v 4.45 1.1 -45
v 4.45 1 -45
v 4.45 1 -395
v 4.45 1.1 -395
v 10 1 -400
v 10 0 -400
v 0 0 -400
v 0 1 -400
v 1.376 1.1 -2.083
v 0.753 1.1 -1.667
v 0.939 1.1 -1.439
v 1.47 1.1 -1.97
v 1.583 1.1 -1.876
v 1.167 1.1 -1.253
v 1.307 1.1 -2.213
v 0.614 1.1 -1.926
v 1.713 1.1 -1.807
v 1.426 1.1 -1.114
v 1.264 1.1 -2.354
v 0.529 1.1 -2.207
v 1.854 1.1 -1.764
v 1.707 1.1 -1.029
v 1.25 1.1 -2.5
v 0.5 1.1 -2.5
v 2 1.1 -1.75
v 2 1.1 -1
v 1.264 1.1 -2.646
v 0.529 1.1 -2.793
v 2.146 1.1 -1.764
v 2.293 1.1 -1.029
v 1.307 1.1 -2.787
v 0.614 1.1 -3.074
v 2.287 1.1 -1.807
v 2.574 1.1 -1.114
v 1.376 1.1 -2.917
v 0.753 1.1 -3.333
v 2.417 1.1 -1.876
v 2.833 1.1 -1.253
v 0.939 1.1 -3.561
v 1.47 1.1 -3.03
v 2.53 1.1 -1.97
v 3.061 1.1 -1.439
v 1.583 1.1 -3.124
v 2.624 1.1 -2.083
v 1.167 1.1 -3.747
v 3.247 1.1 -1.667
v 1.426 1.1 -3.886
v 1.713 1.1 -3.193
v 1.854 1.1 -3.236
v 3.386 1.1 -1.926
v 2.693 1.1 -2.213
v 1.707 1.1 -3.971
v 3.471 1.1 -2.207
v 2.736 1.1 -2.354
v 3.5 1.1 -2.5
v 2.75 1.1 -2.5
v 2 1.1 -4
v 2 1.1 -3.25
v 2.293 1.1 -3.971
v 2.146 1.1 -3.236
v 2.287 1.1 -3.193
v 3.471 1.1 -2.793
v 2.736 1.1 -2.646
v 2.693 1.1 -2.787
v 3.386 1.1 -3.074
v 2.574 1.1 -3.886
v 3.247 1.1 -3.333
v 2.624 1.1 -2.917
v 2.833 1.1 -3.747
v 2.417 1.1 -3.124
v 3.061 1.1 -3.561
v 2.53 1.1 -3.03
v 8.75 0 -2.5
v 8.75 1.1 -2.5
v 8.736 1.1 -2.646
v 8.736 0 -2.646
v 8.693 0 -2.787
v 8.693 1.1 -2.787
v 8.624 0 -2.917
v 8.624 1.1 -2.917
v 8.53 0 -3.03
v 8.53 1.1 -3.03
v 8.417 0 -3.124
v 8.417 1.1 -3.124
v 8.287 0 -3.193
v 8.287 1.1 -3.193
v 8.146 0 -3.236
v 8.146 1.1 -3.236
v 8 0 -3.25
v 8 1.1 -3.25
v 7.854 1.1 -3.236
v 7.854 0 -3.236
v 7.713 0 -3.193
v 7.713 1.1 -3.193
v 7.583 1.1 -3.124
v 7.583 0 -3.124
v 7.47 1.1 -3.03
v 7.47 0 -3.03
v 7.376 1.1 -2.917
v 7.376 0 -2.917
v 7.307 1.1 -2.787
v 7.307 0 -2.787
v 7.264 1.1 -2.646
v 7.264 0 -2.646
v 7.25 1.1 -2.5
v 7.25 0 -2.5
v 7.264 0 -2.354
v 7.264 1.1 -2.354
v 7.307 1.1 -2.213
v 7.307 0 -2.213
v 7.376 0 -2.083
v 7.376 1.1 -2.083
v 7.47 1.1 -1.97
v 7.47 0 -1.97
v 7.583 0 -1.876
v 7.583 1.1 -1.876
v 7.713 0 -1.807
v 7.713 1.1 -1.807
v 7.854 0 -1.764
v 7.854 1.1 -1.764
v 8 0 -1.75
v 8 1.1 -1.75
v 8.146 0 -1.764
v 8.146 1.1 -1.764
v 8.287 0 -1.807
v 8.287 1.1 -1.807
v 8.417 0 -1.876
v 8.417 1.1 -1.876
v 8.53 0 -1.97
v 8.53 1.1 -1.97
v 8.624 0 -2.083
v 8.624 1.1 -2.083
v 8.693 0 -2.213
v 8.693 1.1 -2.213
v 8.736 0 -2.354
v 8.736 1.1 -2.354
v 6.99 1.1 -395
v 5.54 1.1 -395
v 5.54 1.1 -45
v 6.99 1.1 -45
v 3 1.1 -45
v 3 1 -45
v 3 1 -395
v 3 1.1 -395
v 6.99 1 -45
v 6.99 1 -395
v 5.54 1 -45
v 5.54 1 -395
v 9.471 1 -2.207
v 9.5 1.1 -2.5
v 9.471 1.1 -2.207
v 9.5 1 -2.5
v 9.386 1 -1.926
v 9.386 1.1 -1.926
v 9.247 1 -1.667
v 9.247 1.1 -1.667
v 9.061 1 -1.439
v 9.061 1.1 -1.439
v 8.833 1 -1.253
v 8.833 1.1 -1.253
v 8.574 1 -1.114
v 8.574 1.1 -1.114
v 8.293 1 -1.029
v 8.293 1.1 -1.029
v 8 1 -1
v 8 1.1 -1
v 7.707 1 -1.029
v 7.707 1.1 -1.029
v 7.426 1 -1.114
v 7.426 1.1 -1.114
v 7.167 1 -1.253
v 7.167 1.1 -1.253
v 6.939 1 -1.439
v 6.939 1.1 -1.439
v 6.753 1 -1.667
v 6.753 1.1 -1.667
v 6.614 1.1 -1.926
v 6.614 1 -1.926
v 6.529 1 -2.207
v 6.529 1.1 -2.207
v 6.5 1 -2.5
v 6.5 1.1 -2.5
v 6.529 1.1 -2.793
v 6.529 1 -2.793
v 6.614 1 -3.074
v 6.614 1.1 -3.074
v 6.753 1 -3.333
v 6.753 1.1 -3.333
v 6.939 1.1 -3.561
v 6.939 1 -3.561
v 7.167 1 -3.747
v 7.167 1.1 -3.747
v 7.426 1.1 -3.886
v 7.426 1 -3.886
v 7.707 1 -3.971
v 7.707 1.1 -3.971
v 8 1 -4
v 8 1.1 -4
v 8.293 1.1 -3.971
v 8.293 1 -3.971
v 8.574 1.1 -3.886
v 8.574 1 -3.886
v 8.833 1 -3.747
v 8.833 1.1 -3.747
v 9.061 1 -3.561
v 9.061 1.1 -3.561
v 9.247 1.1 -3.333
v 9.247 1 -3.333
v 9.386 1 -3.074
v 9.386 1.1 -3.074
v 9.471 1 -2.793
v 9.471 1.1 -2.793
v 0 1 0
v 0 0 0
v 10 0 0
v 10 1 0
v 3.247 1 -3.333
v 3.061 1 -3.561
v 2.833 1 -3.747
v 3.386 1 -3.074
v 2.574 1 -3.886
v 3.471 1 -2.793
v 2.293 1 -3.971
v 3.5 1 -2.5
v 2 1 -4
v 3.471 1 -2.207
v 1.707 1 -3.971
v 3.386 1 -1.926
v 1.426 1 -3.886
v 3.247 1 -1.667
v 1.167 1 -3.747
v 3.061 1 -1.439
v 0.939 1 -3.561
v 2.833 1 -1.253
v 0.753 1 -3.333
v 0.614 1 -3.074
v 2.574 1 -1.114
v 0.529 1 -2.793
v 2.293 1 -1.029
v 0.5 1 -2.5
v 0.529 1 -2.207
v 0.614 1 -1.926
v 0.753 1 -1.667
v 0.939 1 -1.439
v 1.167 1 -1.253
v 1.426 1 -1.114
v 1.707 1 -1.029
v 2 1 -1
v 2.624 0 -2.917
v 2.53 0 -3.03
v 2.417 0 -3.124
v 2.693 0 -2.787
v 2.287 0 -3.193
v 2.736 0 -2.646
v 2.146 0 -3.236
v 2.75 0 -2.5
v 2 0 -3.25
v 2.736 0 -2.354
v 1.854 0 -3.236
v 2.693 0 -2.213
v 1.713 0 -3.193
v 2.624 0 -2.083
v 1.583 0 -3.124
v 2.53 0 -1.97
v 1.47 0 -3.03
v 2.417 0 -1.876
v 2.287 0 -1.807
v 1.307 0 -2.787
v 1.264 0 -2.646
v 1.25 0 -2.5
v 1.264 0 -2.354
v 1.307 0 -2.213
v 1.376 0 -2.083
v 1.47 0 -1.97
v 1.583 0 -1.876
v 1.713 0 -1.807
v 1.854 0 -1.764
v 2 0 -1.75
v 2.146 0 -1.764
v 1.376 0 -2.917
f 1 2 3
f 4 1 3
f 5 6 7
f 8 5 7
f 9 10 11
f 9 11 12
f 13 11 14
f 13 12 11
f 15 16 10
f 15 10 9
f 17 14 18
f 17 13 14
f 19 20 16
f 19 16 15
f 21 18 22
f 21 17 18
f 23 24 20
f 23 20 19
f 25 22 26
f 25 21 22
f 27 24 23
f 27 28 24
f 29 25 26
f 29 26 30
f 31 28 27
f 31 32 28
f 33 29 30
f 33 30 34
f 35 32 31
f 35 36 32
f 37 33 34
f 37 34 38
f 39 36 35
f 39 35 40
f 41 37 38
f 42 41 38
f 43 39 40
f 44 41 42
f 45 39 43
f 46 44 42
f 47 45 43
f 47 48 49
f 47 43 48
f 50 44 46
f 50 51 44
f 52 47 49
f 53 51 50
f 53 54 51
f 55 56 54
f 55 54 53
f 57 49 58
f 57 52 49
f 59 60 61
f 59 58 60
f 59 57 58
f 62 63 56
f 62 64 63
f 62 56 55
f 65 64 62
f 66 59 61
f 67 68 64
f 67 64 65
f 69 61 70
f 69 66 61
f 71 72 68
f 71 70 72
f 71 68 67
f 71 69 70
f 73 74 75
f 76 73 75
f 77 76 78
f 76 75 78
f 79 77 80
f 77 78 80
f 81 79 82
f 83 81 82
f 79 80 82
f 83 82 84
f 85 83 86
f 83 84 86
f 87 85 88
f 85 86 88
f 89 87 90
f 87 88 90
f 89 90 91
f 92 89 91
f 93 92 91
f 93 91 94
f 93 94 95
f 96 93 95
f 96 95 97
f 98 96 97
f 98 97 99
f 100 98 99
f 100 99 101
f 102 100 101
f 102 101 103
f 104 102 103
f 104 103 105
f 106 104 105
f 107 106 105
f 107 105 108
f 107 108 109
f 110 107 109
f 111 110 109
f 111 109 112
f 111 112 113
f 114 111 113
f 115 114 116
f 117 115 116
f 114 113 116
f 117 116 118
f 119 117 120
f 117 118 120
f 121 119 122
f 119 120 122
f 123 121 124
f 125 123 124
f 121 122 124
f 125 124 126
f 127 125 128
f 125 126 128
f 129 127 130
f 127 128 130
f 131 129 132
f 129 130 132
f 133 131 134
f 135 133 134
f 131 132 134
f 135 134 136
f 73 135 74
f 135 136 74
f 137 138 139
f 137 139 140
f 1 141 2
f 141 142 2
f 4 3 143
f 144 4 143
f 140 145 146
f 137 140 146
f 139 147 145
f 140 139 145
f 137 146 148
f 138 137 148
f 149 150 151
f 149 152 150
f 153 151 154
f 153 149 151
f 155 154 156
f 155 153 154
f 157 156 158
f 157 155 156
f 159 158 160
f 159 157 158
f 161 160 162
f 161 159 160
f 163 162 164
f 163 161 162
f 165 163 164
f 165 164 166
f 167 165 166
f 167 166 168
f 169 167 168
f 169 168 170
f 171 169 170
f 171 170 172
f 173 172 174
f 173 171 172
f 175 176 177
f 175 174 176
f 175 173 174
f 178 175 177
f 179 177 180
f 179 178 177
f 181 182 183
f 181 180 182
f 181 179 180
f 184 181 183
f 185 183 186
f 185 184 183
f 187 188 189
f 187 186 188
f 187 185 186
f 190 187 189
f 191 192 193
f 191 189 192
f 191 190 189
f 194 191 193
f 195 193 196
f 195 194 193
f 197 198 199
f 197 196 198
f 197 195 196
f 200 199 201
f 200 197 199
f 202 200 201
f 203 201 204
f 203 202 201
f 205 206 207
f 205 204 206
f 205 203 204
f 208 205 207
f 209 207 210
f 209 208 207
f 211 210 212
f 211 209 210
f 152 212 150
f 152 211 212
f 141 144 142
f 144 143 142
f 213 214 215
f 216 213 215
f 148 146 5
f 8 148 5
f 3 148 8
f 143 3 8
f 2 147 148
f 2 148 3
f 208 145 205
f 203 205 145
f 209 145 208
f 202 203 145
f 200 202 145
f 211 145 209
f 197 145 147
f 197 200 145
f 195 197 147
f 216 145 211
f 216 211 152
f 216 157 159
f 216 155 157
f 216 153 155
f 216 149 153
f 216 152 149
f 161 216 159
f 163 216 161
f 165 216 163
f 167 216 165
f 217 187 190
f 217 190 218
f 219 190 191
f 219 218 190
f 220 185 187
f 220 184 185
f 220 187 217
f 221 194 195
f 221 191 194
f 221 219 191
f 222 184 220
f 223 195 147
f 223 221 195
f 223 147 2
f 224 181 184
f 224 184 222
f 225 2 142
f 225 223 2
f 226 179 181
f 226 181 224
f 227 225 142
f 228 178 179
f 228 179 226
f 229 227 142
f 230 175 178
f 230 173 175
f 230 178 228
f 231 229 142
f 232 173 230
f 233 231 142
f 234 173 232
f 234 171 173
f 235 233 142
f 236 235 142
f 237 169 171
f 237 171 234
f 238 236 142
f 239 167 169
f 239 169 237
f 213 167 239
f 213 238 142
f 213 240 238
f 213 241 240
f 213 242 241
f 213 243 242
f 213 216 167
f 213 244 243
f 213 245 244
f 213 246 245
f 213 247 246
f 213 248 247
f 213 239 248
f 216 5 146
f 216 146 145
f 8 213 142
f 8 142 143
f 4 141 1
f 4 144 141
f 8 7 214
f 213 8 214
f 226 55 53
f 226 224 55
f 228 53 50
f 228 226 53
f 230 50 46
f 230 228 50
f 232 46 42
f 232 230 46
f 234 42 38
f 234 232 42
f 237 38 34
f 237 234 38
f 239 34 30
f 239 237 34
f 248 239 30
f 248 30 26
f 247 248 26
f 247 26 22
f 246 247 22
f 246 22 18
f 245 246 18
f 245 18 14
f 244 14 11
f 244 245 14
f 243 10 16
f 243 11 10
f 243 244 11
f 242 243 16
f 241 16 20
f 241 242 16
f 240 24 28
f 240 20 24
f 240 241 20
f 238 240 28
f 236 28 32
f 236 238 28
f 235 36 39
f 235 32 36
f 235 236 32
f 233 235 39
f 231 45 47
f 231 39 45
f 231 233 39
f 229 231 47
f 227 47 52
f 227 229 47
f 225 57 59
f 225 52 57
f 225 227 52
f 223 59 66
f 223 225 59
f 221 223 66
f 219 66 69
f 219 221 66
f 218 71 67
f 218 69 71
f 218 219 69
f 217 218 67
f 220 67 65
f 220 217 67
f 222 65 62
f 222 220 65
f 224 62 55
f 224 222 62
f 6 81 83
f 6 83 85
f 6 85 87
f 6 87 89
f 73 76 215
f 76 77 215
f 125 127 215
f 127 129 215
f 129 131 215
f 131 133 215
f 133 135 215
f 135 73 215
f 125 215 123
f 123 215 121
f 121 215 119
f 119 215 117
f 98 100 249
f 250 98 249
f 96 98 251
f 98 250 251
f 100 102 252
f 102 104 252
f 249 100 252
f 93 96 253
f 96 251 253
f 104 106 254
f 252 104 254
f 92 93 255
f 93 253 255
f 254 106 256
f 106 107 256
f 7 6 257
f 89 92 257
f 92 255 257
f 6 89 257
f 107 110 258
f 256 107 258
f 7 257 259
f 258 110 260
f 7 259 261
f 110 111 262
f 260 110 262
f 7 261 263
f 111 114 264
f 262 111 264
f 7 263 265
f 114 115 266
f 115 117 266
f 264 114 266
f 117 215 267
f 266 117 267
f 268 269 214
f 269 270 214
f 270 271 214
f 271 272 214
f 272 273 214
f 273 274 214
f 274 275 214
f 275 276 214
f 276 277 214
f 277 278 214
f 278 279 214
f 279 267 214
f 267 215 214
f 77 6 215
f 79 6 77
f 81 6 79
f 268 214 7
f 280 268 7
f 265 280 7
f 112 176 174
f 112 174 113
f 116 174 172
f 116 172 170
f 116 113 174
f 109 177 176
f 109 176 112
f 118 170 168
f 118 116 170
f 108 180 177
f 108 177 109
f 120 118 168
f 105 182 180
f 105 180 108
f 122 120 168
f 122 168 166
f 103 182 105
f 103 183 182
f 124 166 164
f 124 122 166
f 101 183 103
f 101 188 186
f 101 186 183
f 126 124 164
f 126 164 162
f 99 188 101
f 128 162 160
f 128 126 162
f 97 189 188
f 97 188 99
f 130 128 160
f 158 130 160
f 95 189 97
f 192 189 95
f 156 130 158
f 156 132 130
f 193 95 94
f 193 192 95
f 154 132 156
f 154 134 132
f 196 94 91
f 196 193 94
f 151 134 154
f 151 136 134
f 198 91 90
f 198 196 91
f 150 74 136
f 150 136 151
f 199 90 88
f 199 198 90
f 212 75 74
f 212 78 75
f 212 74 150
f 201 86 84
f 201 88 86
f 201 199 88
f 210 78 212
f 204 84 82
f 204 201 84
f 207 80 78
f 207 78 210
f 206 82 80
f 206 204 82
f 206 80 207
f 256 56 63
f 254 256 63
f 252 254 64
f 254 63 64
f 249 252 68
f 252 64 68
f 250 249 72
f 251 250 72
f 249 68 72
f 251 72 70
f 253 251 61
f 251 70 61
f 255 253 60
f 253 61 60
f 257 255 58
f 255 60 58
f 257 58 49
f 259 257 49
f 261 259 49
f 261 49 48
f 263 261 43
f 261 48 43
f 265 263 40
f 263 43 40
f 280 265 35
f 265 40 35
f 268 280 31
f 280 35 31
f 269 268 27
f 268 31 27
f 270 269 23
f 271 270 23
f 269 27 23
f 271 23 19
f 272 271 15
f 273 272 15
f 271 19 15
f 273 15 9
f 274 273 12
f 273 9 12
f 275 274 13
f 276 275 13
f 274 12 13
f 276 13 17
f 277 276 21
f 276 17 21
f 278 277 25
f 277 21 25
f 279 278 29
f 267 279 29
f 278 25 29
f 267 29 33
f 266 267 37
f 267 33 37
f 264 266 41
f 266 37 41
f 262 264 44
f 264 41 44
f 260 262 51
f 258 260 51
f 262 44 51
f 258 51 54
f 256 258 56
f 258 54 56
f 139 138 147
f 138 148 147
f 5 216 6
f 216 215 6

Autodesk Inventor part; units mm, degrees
ref_plane "YZ Plane" through (0, 0, 0) normal (1, 0, 0) x (0, 1, 0)
ref_plane "XZ Plane" through (0, 0, 0) normal (0, 1, 0) x (-1, 0, 0)
ref_plane "XY Plane" through (0, 0, 0) normal (0, 0, 1) x (1, 0, 0)
sketch "草图1" plane through (0, 0, 0) normal (0, 1, 0) x (-1, 0, 0)
  line L0 (0, 0) -> (-10, 0)
  line L1 (-10, 0) -> (-10, -400)
  line L2 (-10, -400) -> (0, -400)
  line L3 (0, -400) -> (0, 0)
  dimension "d0" = 10
  dimension "d1" = 400
extrude "拉伸1" add sketch "草图1" along normal blind 1
sketch "草图2" plane through (0, 1, 0) normal (0, 1, 0) x (1, 0, 0)
  circle A0 centre (2, 2.5) radius 1.5
  circle A1 centre (8, 2.5) radius 1.5
  line L0 (0, 400) -> (0, 0) projected
  line L1 (10, 0) -> (10, 400) projected
  line L2 (0, 0) -> (10, 0) projected
  dimension "d4" = 3
  dimension "d5" = 3
  dimension "d6" = 2
  dimension "d7" = 2
  dimension "d8" = 2.5
  dimension "d9" = 2.5
sketch "草图3" plane through (0, 1, 0) normal (0, 1, 0) x (1, 0, 0)
  point P0 (0, 0)
extrude "拉伸2" add sketch "草图2" along normal blind 0.1
sketch "草图4" plane through (2, 1.1, -2.5) normal (0, 1, 0) x (1, 0, 0)
  circle A0 centre (0, 0) radius 1.5 projected
  circle A1 centre (0, 0) radius 0.75
  circle A2 centre (6, 0) radius 1.5 projected
  circle A3 centre (6, 0) radius 0.75
  point P0 (-2, -2.5)
  dimension "d12" = 1.5
  dimension "d13" = 1.5
extrude "拉伸3" cut sketch "草图4" against normal blind 3.85 contours A1 | A3
sketch "草图5" plane through (0, 1, 0) normal (0, 1, 0) x (1, 0, 0)
  line L0 (3.0005, 45) -> (4.4505, 45)
  line L1 (4.4505, 45) -> (4.4505, 395)
  line L2 (4.4505, 395) -> (3.0005, 395)
  line L3 (3.0005, 395) -> (3.0005, 45)
  line L4 (5.5405, 45) -> (6.9905, 45)
  line L5 (6.9905, 45) -> (6.9905, 395)
  line L6 (6.9905, 395) -> (5.5405, 395)
  line L7 (5.5405, 395) -> (5.5405, 45)
  line L8 (0, 0) -> (10, 0) projected
  line L9 (10, 400) -> (0, 400) projected
  line L10 (0, 400) -> (0, 0) projected
  dimension "d16" = 1.45
  dimension "d17" = 350
  dimension "d18" = 1.45
  dimension "d19" = 350
  dimension "d20" = 45
  dimension "d21" = 5
  dimension "d22" = 1.09
  dimension "d23" = 3.0005
extrude "拉伸4" add sketch "草图5" along normal blind 0.1
equation "\"折弯半径\" = 厚度"
equation "\"折弯释压宽度\" = 厚度"
equation "\"折弯释压深度\" = 0.5 * 厚度"
equation "\"拐角释压尺寸\" = 4 * 厚度"
equation "\"最小余量\" = 2 * 厚度"
equation "\"过渡半径\" = 折弯半径"
equation "\"Jacobi半径尺寸\" = 折弯半径"
equation "\"间隙大小\" = 厚度"
equation "\"厚度\" = 0.5"
properties part number "Dosyn Rail"
